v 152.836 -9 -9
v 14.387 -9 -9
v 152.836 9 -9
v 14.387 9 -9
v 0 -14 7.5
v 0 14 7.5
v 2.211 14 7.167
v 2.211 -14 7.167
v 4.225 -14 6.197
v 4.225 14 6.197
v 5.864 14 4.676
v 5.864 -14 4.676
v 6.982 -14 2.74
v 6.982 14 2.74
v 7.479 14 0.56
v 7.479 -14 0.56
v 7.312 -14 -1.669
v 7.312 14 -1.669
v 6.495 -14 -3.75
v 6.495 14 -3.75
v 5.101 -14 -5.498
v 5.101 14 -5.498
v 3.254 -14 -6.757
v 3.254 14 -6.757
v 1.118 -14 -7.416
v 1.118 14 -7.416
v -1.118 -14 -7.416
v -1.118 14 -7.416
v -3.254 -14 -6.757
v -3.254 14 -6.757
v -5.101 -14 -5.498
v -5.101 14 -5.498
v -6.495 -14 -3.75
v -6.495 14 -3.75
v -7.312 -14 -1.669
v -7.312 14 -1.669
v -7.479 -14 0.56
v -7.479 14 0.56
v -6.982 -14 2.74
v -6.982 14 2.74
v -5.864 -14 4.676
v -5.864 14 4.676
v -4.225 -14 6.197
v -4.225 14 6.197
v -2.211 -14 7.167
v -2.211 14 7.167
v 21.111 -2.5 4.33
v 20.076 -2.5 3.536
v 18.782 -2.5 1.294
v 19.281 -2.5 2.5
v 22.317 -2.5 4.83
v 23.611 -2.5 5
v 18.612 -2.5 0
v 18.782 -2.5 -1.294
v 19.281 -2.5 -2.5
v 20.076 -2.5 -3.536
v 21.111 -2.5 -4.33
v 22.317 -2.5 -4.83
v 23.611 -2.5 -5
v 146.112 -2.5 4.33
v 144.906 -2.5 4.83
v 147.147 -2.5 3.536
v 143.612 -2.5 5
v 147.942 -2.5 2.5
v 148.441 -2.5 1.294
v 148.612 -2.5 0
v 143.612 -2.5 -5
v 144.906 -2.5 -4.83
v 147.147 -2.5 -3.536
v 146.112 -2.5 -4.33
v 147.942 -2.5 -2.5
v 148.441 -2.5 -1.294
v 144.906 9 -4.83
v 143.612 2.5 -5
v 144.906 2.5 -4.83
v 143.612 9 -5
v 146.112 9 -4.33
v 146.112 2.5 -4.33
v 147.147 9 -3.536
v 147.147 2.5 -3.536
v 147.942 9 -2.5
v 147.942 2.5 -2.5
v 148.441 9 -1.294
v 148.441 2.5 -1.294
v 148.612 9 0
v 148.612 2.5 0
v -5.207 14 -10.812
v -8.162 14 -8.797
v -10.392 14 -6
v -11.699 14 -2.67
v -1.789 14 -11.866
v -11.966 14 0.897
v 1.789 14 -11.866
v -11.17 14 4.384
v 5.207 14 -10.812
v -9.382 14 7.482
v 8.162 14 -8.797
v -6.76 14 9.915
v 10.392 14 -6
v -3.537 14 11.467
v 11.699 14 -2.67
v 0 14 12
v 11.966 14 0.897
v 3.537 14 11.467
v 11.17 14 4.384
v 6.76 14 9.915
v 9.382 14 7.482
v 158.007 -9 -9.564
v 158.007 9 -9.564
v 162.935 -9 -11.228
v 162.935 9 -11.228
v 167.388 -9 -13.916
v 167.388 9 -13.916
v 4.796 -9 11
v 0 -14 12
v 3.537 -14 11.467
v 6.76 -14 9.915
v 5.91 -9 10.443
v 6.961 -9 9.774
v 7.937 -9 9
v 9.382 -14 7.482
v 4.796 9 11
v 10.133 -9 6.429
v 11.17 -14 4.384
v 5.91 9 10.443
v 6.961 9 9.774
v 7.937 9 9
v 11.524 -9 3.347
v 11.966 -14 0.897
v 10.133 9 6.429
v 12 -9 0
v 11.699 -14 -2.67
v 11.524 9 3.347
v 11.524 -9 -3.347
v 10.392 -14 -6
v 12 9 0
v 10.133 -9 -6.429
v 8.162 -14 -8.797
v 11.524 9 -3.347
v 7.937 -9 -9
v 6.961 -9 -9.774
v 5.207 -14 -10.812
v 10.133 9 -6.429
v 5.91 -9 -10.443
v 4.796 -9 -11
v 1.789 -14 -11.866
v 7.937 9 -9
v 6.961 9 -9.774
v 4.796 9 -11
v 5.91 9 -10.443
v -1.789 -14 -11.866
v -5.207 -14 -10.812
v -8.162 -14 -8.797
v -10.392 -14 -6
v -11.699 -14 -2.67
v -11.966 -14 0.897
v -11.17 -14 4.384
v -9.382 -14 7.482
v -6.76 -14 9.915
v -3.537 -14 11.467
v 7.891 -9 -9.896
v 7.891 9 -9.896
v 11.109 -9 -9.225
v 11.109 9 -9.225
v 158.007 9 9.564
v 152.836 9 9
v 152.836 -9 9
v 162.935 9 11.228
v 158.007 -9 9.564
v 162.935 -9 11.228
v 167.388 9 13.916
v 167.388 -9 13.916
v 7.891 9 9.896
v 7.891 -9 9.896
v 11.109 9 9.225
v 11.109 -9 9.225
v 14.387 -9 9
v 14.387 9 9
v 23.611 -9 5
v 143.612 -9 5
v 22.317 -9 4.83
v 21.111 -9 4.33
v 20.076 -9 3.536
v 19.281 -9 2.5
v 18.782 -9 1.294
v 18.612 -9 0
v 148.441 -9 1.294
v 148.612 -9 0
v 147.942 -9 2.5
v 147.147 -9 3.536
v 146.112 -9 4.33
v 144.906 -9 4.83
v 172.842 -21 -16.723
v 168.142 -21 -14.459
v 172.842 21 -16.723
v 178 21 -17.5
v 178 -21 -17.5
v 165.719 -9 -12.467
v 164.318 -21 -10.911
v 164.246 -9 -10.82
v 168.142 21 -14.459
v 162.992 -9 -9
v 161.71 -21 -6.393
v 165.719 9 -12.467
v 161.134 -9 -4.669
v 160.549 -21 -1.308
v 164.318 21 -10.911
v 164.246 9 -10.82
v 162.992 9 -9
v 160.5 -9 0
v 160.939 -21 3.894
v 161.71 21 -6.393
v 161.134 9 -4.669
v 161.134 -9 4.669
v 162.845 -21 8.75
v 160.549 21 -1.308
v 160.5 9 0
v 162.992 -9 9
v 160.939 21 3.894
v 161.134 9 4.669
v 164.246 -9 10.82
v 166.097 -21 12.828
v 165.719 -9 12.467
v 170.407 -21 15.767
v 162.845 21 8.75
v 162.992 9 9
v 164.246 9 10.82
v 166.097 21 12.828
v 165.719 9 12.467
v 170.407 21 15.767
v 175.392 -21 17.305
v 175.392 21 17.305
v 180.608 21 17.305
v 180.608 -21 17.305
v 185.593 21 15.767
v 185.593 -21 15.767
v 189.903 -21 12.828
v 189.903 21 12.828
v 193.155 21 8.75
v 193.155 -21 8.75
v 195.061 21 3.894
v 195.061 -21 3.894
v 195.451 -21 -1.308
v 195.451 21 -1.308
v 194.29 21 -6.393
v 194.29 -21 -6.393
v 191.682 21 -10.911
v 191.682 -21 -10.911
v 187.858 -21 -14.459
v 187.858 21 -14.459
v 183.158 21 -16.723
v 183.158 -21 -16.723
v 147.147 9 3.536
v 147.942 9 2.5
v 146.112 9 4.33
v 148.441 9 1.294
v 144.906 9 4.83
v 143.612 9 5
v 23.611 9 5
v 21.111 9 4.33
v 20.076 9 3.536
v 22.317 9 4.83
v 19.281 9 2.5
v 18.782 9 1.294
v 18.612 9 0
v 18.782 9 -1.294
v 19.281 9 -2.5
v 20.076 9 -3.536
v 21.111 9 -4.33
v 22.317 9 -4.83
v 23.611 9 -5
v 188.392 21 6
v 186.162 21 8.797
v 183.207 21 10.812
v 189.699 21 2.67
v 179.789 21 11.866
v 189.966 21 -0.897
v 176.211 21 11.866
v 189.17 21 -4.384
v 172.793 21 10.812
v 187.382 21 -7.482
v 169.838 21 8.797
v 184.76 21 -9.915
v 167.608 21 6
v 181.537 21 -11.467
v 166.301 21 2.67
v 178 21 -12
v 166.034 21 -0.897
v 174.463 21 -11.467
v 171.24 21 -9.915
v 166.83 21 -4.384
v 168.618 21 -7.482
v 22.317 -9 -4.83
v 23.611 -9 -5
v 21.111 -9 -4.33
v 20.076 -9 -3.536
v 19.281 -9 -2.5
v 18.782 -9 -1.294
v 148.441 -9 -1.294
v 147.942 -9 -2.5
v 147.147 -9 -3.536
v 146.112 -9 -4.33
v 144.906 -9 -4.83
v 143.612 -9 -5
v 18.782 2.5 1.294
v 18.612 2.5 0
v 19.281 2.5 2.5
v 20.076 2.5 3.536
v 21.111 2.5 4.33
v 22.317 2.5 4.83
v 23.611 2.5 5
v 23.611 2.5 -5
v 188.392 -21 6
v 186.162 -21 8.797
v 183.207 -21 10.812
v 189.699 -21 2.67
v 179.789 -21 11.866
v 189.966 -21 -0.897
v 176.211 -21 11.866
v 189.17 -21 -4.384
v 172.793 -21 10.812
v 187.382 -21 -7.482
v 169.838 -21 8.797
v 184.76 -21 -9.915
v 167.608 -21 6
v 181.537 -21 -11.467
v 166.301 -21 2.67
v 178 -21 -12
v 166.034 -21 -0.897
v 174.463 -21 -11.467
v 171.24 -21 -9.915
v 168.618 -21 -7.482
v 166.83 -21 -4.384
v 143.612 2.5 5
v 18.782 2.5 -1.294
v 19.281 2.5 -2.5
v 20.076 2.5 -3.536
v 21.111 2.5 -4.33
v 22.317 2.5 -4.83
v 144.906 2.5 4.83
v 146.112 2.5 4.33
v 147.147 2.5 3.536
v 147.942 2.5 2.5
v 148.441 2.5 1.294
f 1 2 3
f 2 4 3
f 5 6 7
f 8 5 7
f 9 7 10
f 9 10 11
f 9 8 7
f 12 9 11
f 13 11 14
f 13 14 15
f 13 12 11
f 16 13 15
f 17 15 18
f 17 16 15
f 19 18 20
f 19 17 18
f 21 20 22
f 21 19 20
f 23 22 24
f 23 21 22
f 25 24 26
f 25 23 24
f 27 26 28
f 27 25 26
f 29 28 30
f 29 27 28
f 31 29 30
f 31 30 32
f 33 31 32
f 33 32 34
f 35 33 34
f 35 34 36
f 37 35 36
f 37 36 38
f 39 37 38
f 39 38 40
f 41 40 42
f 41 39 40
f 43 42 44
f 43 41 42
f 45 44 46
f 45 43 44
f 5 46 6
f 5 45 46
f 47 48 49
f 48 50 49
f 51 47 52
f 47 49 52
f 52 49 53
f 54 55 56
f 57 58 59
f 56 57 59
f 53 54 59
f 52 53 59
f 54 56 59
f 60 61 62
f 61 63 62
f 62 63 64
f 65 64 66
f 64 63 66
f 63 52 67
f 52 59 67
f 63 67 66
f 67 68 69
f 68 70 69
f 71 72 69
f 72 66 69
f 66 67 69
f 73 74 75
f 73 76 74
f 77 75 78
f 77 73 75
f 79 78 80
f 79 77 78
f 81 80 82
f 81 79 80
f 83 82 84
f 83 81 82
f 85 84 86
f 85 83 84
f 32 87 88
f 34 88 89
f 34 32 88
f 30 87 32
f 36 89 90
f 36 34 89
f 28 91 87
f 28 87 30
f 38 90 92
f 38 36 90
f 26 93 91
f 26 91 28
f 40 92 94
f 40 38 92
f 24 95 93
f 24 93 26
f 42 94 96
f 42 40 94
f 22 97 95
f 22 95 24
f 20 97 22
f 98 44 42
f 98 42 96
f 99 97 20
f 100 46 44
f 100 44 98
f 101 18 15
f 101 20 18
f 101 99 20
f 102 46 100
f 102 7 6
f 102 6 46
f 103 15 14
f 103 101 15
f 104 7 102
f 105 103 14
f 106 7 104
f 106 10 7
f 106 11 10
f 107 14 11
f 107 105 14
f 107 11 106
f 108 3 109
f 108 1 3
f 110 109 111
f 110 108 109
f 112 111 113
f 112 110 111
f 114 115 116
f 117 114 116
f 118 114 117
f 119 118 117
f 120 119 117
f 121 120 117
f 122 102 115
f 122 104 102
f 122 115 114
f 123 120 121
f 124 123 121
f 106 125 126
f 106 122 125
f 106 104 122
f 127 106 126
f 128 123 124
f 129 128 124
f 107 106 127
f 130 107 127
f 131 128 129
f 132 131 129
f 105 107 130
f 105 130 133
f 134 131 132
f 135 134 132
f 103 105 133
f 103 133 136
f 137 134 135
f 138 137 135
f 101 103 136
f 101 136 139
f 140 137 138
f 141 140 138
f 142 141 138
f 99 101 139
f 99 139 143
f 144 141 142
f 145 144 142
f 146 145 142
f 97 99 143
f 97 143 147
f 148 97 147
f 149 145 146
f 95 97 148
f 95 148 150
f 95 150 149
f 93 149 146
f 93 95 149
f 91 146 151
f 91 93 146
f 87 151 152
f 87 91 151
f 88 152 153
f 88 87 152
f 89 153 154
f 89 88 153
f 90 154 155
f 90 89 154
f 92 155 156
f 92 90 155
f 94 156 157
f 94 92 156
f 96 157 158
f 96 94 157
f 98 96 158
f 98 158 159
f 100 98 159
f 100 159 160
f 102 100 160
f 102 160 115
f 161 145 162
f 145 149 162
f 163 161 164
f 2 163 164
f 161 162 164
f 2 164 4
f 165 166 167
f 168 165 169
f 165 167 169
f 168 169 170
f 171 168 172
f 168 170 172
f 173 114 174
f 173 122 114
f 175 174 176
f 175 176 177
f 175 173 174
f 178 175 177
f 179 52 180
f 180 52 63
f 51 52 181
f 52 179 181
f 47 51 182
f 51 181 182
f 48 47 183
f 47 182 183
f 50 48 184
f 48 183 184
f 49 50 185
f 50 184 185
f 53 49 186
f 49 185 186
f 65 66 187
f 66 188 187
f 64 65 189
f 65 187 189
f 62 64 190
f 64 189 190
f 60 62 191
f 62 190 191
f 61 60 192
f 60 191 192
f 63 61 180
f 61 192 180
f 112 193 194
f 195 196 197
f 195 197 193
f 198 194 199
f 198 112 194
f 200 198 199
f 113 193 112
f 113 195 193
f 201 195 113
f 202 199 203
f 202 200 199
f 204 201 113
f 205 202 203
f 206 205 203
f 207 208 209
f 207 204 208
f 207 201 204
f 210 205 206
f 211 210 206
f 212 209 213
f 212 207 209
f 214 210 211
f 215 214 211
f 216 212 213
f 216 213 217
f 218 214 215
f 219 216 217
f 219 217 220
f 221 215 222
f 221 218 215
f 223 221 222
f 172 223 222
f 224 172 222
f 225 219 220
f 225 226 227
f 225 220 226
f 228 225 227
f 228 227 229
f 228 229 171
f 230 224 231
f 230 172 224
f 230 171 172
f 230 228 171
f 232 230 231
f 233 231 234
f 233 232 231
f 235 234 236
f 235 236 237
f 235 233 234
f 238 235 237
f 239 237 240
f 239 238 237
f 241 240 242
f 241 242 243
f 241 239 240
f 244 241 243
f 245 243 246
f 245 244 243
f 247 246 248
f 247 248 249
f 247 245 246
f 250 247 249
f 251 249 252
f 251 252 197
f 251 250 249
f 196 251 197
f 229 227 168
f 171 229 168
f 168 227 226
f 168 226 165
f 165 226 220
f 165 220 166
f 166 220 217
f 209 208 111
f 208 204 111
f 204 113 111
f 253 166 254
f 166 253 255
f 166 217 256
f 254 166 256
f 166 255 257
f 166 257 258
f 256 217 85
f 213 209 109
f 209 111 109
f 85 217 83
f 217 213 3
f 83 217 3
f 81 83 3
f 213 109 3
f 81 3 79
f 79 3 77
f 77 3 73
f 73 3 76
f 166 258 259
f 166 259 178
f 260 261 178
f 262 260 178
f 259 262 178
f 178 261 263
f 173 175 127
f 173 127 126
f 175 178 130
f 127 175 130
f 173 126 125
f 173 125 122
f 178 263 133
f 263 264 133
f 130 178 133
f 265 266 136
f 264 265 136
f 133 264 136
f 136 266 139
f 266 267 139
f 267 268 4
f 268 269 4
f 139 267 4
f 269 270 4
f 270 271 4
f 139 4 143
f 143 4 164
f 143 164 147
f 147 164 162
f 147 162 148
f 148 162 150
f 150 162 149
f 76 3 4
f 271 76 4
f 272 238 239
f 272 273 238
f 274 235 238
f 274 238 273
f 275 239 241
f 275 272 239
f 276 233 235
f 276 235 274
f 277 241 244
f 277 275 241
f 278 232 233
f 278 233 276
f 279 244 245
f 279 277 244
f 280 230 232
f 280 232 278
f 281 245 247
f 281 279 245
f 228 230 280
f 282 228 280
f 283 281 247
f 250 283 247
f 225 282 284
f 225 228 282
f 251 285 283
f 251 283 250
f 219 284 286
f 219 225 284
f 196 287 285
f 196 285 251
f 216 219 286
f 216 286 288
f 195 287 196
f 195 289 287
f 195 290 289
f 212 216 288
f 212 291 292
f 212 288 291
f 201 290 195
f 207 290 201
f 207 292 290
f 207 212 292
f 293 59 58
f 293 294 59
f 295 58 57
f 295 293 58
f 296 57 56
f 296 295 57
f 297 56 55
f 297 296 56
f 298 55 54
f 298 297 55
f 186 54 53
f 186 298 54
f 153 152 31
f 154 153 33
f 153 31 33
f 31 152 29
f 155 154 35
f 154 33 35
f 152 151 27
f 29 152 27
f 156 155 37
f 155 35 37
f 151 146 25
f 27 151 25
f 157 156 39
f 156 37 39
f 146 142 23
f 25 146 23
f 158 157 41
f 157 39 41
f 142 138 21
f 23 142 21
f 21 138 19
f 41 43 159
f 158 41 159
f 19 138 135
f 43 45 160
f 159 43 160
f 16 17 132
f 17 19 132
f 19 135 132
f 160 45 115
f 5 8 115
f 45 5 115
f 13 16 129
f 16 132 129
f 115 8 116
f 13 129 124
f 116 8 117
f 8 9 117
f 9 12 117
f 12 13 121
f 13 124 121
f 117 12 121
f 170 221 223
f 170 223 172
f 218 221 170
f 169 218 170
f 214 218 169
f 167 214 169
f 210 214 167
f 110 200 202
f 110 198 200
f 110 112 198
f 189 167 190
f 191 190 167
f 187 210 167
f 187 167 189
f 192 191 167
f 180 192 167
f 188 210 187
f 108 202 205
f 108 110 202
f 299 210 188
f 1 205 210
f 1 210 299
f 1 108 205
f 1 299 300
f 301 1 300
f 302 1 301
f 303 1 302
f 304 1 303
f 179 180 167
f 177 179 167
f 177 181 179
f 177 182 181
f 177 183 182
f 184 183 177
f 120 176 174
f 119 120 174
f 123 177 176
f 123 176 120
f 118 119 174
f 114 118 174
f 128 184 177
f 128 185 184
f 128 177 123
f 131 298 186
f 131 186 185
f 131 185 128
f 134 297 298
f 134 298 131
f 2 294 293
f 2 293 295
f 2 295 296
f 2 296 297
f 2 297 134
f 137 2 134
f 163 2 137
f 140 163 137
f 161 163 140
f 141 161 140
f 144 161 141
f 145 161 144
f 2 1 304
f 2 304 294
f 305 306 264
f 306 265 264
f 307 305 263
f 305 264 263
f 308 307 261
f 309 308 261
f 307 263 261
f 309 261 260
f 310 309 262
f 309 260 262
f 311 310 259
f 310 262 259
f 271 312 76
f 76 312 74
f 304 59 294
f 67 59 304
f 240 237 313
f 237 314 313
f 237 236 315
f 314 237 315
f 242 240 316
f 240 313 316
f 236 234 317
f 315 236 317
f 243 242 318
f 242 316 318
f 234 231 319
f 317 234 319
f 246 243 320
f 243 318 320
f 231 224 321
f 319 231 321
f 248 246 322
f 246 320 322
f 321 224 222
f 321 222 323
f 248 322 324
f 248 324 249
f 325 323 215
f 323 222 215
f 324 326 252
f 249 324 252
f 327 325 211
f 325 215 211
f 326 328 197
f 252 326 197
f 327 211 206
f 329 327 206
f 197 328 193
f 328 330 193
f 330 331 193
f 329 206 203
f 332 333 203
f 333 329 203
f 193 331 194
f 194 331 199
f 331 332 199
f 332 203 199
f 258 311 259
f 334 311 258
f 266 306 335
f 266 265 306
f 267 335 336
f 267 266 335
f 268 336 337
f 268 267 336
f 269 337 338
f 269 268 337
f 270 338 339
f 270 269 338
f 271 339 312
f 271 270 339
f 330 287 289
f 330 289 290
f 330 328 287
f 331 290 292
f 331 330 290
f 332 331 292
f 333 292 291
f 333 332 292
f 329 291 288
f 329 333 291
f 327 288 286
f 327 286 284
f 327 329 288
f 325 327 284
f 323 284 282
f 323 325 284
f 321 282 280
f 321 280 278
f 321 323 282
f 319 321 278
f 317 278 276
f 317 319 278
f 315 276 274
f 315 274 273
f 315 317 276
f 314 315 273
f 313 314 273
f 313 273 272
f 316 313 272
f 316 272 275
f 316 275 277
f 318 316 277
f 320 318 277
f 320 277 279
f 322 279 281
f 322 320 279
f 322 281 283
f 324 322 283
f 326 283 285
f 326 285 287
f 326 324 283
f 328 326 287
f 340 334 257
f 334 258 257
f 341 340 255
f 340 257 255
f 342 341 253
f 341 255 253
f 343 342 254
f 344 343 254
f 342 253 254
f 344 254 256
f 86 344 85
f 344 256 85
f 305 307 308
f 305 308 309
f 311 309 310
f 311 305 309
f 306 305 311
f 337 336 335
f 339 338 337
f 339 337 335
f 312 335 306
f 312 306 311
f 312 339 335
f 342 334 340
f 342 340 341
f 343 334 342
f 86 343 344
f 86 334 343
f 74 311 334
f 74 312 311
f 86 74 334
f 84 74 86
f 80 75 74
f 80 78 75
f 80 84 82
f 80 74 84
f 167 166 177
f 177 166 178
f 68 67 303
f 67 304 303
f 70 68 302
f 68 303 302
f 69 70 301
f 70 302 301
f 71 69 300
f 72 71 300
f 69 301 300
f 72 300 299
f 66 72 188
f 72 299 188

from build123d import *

# Parameters (mm, degrees)
SKETCH1_R           = 17.5
SKETCH1_R_2         = 12
BOSS_EXTRUDE1_DEPTH = 21
SKETCH1_5_R         = 12
SKETCH1_5_R_2       = 7.5
BOSS_EXTRUDE2_DEPTH = 14
BOSS_EXTRUDE3_DEPTH = 9
FILLET2_R           = 24
CUT_EXTRUDE1_START  = -2.5
SKETCH4_W           = 130
SKETCH4_H           = 10
CUT_EXTRUDE1_DEPTH  = 18
FILLET4_R           = 5
FILLET5_R           = 5
FILLET6_R           = 5
FILLET7_R           = 5


with BuildPart() as part:
    # Sketch1 → Boss-Extrude1 (new, symmetric)
    with BuildSketch(Plane(origin=(0, 0, 0), x_dir=(1, 0, 0), z_dir=(0, 1, 0))):
        with Locations(Location((178, 0, 0), (0, 0, 90))):
            Circle(SKETCH1_R)
        with Locations(Location((178, 0, 0), (0, 0, 90))):
            Circle(SKETCH1_R_2, mode=Mode.SUBTRACT)
    extrude(amount=BOSS_EXTRUDE1_DEPTH, both=True)



with BuildPart() as body_2:
    # Sketch1<5> → Boss-Extrude2 (new, symmetric)
    with BuildSketch(Plane(origin=(0, 0, 0), x_dir=(1, 0, 0), z_dir=(0, 1, 0))):
        with Locations(Location((0, 0, 0), (0, 0, 270))):
            Circle(SKETCH1_5_R)
        with Locations(Location((0, 0, 0), (0, 0, 270))):
            Circle(SKETCH1_5_R_2, mode=Mode.SUBTRACT)
    extrude(amount=BOSS_EXTRUDE2_DEPTH, both=True)


with BuildPart() as part_1:
    add(part.part)

    add(body_2.part)  # Boss-Extrude3 merges body 2
    # Sketch2 → Boss-Extrude3 (add, symmetric)
    with BuildSketch(Plane(origin=(0, 0, 0), x_dir=(1, 0, 0), z_dir=(0, 1, 0))):
        with BuildLine():
            Line((7.937253933, 9), (162.99166898, 9))
            ThreePointArc((162.99166898, 9), (160.5, 0), (162.99166898, -9))
            Line((162.99166898, -9), (7.937253933, -9))
            ThreePointArc((7.937253933, -9), (12, 0), (7.937253933, 9))
        make_face()
    extrude(amount=BOSS_EXTRUDE3_DEPTH, both=True)

    # Fillet2
    fillet2_edges = [part_1.edges().sort_by_distance(p)[0] for p in [
        (162.99166898, 0, 9),
        (162.99166898, 0, -9),
        (7.937253933, 0, -9),
        (7.937253933, 0, 9),
    ]]
    fillet(fillet2_edges, radius=FILLET2_R)

    # Sketch4 → Cut-Extrude1 (cut)
    with BuildSketch(Plane(origin=(0, 0, 0), x_dir=(1, 0, 0), z_dir=(0, 1, 0)).offset(CUT_EXTRUDE1_START)):
        with Locations((83.611517753, 0)):
            Rectangle(SKETCH4_W, SKETCH4_H)
    cut_extrude1 = extrude(amount=-CUT_EXTRUDE1_DEPTH, mode=Mode.SUBTRACT)

    # Mirror1: Cut-Extrude1 across plane
    add(cut_extrude1.mirror(Plane.ZX), mode=Mode.SUBTRACT)

    # Fillet4
    fillet4_edges = [part_1.edges().sort_by_distance(p)[0] for p in [
        (18.611517753, 5.75, -5),
        (18.611517753, 5.75, 5),
    ]]
    fillet(fillet4_edges, radius=FILLET4_R - 0.0001)  # a hair under: the kernel refuses the full size

    # Fillet5
    fillet5_edges = [part_1.edges().sort_by_distance(p)[0] for p in [
        (148.611517753, 5.75, 5),
        (148.611517753, 5.75, -5),
    ]]
    fillet(fillet5_edges, radius=FILLET5_R - 0.0001)  # a hair under: the kernel refuses the full size

    # Fillet6
    fillet6_edges = [part_1.edges().sort_by_distance(p)[0] for p in [
        (18.611517753, -5.75, 5),
        (18.611517753, -5.75, -5),
    ]]
    fillet(fillet6_edges, radius=FILLET6_R - 0.0001)  # a hair under: the kernel refuses the full size

    # Fillet7
    fillet7_edges = [part_1.edges().sort_by_distance(p)[0] for p in [
        (148.611517753, -5.75, -5),
        (148.611517753, -5.75, 5),
    ]]
    fillet(fillet7_edges, radius=FILLET7_R - 0.0001)  # a hair under: the kernel refuses the full size


solid = part_1.part
